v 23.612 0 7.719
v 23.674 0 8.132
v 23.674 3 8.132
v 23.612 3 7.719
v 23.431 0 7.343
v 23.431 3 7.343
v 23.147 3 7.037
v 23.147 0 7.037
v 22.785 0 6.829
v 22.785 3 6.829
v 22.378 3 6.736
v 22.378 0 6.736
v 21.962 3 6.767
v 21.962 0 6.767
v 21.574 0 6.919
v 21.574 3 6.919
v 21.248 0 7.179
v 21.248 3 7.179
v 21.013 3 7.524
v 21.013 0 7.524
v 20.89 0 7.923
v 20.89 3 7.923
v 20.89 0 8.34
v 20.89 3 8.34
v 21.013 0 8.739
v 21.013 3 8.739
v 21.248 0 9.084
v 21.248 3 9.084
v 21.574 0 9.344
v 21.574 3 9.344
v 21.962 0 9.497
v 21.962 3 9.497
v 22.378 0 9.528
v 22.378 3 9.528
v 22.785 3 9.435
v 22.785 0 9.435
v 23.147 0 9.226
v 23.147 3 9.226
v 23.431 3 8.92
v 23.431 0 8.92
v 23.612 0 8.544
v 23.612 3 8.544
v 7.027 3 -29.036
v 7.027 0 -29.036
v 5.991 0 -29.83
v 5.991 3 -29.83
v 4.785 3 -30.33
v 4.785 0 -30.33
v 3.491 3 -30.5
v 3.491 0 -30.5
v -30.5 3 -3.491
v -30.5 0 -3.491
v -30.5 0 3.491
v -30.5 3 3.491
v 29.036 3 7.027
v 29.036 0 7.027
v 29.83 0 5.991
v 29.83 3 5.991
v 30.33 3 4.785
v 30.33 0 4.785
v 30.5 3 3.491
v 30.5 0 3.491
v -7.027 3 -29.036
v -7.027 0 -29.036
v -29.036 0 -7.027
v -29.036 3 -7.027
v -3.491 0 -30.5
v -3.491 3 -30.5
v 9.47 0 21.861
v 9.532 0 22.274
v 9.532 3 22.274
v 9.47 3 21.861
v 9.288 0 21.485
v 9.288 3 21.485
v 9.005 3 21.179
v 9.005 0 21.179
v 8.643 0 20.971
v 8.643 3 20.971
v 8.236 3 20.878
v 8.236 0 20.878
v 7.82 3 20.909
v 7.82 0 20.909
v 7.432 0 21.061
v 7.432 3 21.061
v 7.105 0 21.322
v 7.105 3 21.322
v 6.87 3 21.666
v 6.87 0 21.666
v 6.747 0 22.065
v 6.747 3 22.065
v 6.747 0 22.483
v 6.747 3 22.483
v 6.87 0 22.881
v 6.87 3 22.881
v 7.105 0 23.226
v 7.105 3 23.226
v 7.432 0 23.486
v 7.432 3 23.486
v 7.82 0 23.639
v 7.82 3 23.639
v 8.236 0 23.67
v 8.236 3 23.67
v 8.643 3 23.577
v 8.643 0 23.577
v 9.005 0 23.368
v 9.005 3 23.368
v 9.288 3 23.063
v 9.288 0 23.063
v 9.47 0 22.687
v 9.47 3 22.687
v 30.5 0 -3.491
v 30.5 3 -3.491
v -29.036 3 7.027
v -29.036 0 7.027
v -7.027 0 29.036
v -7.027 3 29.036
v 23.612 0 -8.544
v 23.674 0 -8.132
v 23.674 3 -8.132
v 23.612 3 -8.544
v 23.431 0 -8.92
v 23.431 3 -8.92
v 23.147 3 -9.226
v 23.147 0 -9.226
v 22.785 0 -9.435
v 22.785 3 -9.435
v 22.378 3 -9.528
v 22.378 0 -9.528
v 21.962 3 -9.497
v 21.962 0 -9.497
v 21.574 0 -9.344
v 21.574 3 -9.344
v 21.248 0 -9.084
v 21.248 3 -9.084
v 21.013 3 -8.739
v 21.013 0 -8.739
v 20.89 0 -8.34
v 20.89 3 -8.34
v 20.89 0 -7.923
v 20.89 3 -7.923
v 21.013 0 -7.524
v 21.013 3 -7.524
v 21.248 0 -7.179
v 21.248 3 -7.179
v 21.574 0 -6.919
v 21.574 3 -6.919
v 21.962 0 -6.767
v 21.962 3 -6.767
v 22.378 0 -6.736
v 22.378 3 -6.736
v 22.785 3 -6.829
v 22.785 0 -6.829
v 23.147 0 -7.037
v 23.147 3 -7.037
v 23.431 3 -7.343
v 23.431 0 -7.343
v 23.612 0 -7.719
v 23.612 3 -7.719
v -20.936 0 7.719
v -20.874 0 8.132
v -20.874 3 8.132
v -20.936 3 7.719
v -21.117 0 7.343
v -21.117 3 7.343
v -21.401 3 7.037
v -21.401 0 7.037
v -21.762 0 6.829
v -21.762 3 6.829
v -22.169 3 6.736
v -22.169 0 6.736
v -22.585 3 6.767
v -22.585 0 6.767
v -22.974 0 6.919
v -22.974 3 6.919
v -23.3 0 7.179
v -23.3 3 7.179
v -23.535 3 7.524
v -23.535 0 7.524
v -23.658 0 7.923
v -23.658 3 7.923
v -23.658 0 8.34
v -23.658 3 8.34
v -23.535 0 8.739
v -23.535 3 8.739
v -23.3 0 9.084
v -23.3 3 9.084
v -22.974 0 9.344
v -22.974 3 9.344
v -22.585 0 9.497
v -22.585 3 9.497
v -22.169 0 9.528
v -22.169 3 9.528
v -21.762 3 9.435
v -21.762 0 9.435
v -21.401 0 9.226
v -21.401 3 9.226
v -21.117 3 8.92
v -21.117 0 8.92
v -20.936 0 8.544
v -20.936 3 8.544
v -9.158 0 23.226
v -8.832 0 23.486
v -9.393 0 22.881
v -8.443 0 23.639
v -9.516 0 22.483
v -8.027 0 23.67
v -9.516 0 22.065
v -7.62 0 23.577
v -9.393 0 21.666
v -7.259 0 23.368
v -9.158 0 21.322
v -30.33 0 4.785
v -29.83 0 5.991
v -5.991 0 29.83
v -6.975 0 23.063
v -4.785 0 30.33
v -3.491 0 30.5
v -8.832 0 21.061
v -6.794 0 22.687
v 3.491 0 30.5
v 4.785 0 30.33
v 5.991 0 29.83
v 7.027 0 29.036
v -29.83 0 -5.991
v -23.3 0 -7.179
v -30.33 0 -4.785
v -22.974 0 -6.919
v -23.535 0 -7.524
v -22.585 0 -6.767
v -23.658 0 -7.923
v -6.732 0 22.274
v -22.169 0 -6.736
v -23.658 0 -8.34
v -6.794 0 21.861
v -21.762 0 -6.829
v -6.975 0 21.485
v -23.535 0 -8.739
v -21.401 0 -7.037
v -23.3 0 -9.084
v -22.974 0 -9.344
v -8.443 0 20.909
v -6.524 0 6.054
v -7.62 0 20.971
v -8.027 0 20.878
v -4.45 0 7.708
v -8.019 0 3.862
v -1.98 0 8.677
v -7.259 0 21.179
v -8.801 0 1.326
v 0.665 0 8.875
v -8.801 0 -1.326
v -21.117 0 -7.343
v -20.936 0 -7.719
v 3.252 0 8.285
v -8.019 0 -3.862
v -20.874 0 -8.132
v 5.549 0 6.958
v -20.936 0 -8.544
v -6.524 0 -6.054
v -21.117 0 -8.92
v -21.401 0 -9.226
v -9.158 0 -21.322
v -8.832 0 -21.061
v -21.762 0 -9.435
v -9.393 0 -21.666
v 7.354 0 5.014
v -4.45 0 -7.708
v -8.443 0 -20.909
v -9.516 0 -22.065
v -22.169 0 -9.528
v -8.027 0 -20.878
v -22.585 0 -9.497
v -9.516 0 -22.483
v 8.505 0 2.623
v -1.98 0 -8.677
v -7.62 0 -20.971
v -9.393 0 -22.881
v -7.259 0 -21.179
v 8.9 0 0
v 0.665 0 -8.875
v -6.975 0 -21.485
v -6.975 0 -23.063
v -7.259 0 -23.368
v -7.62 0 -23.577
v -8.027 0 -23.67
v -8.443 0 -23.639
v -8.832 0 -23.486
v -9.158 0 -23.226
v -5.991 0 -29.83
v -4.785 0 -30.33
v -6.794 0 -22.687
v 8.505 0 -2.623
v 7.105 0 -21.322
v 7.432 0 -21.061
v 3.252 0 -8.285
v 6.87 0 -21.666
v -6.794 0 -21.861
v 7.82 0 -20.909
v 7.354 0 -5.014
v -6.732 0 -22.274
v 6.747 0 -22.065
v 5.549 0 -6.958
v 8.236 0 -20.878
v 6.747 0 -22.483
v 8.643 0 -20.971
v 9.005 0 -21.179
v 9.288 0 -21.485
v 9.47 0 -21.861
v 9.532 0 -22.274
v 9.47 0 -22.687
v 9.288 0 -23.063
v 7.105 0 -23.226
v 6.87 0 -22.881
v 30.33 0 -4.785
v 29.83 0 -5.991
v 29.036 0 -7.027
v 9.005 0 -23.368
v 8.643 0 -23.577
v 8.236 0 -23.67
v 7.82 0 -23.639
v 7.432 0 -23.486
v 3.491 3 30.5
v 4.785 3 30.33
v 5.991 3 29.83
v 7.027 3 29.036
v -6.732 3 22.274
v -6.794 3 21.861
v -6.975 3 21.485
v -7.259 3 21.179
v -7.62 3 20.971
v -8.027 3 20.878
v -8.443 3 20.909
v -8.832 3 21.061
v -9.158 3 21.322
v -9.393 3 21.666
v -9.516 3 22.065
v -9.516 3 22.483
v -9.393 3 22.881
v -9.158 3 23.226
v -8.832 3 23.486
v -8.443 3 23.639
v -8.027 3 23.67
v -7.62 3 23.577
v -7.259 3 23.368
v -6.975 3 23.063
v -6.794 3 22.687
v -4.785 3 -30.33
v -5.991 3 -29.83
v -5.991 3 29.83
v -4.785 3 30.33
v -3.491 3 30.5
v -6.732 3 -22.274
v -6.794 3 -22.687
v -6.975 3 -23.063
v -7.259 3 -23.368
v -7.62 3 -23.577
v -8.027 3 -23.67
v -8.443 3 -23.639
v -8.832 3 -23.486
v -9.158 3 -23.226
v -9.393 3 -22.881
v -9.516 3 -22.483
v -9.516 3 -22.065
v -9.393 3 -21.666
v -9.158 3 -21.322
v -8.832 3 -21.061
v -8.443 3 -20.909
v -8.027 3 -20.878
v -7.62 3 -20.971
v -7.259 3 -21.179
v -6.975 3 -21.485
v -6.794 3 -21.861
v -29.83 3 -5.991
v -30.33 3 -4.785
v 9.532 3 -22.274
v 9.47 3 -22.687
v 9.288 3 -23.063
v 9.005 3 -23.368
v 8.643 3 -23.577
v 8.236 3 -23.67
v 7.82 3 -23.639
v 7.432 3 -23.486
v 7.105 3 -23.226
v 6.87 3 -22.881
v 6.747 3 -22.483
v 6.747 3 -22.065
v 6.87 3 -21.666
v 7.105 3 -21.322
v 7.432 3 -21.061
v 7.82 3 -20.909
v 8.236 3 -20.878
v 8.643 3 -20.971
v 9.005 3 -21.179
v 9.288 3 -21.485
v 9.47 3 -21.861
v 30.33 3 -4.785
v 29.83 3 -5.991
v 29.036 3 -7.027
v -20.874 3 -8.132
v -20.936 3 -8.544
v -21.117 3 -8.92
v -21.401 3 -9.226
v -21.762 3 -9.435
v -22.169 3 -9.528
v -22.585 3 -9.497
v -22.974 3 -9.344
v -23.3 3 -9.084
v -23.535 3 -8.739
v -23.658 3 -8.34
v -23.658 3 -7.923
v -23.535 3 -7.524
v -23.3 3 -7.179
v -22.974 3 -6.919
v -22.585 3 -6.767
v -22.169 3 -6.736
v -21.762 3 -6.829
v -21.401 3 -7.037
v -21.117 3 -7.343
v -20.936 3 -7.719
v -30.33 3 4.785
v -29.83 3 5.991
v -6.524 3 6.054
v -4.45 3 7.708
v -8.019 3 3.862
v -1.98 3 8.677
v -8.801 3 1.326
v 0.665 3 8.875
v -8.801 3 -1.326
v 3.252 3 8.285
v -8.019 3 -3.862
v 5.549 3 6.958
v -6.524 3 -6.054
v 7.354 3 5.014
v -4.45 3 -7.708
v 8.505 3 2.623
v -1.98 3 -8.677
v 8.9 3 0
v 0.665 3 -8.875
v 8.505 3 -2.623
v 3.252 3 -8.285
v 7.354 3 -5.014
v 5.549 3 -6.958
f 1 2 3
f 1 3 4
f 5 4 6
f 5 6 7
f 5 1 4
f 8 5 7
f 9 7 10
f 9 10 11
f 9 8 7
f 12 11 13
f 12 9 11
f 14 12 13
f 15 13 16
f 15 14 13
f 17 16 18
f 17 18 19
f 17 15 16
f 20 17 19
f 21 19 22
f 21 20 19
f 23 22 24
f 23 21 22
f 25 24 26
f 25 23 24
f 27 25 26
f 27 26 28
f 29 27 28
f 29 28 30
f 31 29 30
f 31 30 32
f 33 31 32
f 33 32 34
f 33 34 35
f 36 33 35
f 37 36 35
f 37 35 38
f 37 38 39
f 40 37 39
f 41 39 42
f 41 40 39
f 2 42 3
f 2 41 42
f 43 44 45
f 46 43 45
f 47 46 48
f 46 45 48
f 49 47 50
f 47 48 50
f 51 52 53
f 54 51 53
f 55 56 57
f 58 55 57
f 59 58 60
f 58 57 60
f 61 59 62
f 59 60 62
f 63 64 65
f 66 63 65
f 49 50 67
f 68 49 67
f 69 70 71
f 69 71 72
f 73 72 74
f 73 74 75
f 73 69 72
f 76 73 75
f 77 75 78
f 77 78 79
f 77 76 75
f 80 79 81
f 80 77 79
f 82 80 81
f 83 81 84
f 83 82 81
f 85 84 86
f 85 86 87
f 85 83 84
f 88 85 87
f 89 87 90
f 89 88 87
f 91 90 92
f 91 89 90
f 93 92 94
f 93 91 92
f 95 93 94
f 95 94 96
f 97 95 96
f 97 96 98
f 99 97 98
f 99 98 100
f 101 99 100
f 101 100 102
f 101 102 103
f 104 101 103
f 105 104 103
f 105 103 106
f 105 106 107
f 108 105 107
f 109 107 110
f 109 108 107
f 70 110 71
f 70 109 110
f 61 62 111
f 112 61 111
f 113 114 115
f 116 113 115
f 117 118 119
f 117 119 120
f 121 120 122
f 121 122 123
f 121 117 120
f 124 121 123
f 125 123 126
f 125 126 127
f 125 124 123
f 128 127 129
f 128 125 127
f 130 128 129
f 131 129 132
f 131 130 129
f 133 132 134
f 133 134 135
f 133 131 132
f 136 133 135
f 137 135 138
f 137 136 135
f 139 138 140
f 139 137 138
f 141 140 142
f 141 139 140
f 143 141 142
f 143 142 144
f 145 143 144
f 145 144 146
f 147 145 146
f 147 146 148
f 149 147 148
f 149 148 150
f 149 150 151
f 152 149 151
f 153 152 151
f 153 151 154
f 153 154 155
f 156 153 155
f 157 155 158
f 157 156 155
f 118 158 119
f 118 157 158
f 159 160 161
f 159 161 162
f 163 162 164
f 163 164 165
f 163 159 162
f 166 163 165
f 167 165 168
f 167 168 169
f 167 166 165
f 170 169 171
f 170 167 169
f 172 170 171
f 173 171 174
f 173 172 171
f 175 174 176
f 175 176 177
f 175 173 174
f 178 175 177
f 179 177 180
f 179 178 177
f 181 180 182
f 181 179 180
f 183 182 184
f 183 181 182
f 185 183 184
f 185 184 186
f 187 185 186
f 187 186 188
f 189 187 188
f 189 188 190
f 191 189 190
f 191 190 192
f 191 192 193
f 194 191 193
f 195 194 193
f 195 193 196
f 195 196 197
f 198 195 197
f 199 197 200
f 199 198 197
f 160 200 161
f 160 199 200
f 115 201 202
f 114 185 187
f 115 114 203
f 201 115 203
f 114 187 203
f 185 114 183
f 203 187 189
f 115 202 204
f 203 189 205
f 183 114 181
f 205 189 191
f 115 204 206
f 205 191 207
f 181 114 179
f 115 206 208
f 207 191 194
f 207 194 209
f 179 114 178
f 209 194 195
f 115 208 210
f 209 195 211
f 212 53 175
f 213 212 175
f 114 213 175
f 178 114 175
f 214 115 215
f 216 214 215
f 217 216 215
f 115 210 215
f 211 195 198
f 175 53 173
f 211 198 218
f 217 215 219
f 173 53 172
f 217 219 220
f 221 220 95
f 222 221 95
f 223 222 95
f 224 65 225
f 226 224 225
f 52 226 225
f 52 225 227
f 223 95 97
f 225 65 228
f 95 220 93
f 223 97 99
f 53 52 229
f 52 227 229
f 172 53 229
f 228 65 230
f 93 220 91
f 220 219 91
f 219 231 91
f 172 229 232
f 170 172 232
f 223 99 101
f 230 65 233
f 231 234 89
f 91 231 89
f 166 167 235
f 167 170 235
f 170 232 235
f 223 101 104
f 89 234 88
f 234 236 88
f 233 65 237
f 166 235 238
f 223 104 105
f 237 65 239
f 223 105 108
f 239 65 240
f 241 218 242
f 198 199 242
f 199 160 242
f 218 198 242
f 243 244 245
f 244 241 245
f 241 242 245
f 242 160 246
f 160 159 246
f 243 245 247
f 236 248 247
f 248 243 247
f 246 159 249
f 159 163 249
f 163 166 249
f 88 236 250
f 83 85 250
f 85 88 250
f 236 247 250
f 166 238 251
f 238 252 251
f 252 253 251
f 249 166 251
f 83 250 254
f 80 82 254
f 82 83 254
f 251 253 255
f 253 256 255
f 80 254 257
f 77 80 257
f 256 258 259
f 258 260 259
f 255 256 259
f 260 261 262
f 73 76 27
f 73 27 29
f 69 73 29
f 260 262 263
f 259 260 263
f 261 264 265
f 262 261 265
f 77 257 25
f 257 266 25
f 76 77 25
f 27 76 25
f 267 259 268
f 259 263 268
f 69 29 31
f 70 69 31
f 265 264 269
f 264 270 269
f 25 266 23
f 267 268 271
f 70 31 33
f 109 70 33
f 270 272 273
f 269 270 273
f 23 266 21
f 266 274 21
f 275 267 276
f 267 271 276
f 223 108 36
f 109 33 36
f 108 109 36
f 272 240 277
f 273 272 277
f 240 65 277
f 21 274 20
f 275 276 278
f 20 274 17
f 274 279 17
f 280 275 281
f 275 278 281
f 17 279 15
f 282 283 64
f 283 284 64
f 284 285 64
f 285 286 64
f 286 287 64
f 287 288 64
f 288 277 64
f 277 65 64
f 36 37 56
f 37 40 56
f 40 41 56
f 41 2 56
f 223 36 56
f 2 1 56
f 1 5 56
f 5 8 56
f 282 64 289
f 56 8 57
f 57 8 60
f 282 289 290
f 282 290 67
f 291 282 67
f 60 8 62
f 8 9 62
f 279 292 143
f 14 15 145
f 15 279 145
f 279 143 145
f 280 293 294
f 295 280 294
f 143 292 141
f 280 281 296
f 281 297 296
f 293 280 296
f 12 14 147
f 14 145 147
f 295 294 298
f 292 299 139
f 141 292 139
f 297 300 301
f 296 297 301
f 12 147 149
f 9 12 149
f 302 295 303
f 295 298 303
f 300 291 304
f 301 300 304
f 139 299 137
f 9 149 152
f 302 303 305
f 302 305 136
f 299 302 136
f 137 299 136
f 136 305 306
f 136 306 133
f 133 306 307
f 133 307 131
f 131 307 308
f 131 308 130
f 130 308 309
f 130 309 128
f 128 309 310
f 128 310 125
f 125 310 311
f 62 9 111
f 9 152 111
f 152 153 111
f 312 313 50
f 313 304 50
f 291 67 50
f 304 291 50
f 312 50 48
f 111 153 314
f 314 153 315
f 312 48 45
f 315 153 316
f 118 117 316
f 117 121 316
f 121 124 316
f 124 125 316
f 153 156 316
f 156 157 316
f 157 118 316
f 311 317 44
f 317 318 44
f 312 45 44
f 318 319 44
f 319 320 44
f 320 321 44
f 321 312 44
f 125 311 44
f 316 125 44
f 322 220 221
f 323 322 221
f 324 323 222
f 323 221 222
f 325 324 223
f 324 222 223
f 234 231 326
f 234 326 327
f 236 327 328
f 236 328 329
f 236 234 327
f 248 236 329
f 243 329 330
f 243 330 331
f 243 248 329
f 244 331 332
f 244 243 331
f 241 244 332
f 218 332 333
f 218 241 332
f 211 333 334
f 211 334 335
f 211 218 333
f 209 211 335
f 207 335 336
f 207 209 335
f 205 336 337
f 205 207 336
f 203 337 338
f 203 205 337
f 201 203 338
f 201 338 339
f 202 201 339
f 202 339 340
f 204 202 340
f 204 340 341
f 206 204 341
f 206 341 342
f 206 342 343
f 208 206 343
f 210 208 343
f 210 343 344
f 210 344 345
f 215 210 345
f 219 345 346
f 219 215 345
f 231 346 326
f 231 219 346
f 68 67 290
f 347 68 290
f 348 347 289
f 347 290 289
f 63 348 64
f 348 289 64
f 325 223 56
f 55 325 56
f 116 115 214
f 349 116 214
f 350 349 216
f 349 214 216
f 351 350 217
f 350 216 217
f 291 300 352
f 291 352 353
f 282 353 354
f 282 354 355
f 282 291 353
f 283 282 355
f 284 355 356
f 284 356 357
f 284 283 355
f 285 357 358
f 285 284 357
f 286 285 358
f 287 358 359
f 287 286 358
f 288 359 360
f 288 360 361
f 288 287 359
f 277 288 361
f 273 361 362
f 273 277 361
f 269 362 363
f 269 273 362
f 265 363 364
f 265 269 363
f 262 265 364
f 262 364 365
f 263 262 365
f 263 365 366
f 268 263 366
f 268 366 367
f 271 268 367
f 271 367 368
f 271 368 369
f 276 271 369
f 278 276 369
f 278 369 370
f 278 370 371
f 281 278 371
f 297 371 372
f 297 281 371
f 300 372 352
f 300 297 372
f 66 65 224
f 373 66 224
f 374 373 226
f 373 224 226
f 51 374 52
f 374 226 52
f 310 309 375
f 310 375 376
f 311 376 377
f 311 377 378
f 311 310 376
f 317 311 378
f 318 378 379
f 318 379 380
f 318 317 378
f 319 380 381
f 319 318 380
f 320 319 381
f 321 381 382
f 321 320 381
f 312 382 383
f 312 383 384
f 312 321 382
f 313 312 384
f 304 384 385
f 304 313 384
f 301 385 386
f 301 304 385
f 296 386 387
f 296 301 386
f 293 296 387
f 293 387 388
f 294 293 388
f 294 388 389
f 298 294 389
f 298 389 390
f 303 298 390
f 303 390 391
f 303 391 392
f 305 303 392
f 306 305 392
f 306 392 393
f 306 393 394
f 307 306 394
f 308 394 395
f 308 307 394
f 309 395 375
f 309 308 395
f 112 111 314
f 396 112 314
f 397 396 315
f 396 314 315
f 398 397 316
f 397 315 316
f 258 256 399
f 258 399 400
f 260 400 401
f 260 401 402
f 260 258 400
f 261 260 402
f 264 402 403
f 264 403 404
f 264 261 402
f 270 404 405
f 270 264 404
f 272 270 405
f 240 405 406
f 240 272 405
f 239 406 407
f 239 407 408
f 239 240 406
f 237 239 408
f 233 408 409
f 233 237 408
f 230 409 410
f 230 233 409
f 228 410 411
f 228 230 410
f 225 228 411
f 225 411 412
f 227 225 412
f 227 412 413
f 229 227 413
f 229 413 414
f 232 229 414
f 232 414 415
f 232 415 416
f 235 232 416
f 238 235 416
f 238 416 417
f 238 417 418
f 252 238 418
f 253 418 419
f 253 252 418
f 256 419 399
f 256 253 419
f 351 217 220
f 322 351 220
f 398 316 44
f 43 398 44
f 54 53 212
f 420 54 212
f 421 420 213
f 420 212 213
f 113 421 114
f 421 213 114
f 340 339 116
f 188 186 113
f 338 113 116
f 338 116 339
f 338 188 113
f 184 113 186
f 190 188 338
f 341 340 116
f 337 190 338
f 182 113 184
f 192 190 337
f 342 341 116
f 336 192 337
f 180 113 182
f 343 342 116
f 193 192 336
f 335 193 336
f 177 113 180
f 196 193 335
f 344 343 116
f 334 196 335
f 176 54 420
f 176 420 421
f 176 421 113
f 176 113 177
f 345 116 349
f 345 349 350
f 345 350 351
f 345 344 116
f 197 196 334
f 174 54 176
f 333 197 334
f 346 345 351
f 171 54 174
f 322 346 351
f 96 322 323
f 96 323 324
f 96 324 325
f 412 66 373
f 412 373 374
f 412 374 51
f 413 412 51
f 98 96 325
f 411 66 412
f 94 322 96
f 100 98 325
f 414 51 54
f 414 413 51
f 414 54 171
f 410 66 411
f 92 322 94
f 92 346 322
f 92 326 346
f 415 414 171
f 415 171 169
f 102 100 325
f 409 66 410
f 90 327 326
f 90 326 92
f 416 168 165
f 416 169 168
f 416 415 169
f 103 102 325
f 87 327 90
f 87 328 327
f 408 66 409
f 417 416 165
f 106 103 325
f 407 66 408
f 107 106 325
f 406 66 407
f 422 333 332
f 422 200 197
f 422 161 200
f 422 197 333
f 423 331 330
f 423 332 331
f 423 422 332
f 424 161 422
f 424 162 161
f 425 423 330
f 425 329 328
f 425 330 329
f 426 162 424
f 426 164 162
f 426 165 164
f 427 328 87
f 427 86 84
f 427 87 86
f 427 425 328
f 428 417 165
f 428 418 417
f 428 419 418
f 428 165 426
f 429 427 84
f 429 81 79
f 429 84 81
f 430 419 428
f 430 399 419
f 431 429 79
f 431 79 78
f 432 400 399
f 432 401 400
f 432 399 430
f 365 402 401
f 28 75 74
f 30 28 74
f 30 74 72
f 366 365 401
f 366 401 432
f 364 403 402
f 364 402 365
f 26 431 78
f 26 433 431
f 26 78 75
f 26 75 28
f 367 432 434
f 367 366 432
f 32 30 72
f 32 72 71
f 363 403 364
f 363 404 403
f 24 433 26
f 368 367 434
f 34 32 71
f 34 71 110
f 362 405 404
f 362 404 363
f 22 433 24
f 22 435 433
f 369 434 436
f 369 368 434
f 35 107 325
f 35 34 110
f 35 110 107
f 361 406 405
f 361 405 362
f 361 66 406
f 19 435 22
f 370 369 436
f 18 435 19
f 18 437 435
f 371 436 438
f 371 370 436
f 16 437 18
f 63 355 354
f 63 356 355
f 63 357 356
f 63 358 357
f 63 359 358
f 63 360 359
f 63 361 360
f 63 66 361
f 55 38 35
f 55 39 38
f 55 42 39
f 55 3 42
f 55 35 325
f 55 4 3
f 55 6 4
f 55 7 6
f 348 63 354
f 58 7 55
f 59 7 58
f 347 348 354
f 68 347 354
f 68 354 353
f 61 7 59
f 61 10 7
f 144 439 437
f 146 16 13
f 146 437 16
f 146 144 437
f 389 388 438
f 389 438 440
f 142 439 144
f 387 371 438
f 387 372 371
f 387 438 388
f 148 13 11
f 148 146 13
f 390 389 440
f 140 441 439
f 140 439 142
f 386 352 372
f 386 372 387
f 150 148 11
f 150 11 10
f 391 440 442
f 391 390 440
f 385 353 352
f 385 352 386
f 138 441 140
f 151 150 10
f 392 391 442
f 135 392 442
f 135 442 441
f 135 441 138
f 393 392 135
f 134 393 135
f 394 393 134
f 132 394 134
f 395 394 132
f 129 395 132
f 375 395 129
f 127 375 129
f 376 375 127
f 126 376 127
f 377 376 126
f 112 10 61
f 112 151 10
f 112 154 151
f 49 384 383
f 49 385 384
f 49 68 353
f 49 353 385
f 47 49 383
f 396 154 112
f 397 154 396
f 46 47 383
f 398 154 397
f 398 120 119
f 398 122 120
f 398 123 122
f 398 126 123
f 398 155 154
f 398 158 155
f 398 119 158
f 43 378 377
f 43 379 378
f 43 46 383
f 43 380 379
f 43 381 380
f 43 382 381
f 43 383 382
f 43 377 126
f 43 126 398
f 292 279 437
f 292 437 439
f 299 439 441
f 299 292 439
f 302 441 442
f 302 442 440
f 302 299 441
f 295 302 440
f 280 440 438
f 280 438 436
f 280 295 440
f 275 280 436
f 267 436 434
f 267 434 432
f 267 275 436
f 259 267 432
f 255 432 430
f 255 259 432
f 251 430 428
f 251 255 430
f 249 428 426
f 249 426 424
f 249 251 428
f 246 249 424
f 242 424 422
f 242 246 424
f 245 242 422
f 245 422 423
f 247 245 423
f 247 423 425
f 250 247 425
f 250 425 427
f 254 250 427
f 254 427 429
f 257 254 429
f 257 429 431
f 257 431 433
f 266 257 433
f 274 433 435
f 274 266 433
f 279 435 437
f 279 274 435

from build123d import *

# Parameters (mm, degrees)
SKETCH1_R           = 8.9
SKETCH1_R_2         = 1.4
BOSS_EXTRUDE1_DEPTH = 3


with BuildPart() as part:
    # Sketch1 → Boss-Extrude1 (new body)
    with BuildSketch(Plane(origin=(0, 0, 0), x_dir=(1, 0, 0), z_dir=(0, 1, 0))):
        with BuildLine():
            Line((3.491378029, 30.5), (-3.491378029, 30.5))
            ThreePointArc((-3.491378029, 30.5), (-5.40479519, 30.119397663), (-7.026911935, 29.035533906))
            Line((-7.026911935, 29.035533906), (-29.035533906, 7.026911935))
            ThreePointArc((-29.035533906, 7.026911935), (-30.119397663, 5.40479519), (-30.5, 3.491378029))
            Line((-30.5, 3.491378029), (-30.5, -3.491378029))
            ThreePointArc((-30.5, -3.491378029), (-30.119397663, -5.40479519), (-29.035533906, -7.026911935))
            Line((-29.035533906, -7.026911935), (-7.026911935, -29.035533906))
            ThreePointArc((-7.026911935, -29.035533906), (-5.40479519, -30.119397663), (-3.491378029, -30.5))
            Line((-3.491378029, -30.5), (3.491378029, -30.5))
            ThreePointArc((3.491378029, -30.5), (5.40479519, -30.119397663), (7.026911935, -29.035533906))
            Line((7.026911935, -29.035533906), (29.035533906, -7.026911935))
            ThreePointArc((29.035533906, -7.026911935), (30.119397663, -5.40479519), (30.5, -3.491378029))
            Line((30.5, -3.491378029), (30.5, 3.491378029))
            ThreePointArc((30.5, 3.491378029), (30.119397663, 5.40479519), (29.035533906, 7.026911935))
            Line((29.035533906, 7.026911935), (7.026911935, 29.035533906))
            ThreePointArc((7.026911935, 29.035533906), (5.40479519, 30.119397663), (3.491378029, 30.5))
        make_face()
        Circle(SKETCH1_R, mode=Mode.SUBTRACT)
        with Locations((8.131727984, -22.273863607)):
            Circle(SKETCH1_R_2, mode=Mode.SUBTRACT)
        with Locations((-8.131727984, -22.273863607)):
            Circle(SKETCH1_R_2, mode=Mode.SUBTRACT)
        with Locations((-22.273863607, -8.131727984)):
            Circle(SKETCH1_R_2, mode=Mode.SUBTRACT)
        with Locations((22.273863607, -8.131727984)):
            Circle(SKETCH1_R_2, mode=Mode.SUBTRACT)
        with Locations((22.273863607, 8.131727984)):
            Circle(SKETCH1_R_2, mode=Mode.SUBTRACT)
        with Locations((8.131727984, 22.273863607)):
            Circle(SKETCH1_R_2, mode=Mode.SUBTRACT)
        with Locations((-8.131727984, 22.273863607)):
            Circle(SKETCH1_R_2, mode=Mode.SUBTRACT)
        with Locations((-22.273863607, 8.131727984)):
            Circle(SKETCH1_R_2, mode=Mode.SUBTRACT)
    extrude(amount=BOSS_EXTRUDE1_DEPTH)


solid = part.part
